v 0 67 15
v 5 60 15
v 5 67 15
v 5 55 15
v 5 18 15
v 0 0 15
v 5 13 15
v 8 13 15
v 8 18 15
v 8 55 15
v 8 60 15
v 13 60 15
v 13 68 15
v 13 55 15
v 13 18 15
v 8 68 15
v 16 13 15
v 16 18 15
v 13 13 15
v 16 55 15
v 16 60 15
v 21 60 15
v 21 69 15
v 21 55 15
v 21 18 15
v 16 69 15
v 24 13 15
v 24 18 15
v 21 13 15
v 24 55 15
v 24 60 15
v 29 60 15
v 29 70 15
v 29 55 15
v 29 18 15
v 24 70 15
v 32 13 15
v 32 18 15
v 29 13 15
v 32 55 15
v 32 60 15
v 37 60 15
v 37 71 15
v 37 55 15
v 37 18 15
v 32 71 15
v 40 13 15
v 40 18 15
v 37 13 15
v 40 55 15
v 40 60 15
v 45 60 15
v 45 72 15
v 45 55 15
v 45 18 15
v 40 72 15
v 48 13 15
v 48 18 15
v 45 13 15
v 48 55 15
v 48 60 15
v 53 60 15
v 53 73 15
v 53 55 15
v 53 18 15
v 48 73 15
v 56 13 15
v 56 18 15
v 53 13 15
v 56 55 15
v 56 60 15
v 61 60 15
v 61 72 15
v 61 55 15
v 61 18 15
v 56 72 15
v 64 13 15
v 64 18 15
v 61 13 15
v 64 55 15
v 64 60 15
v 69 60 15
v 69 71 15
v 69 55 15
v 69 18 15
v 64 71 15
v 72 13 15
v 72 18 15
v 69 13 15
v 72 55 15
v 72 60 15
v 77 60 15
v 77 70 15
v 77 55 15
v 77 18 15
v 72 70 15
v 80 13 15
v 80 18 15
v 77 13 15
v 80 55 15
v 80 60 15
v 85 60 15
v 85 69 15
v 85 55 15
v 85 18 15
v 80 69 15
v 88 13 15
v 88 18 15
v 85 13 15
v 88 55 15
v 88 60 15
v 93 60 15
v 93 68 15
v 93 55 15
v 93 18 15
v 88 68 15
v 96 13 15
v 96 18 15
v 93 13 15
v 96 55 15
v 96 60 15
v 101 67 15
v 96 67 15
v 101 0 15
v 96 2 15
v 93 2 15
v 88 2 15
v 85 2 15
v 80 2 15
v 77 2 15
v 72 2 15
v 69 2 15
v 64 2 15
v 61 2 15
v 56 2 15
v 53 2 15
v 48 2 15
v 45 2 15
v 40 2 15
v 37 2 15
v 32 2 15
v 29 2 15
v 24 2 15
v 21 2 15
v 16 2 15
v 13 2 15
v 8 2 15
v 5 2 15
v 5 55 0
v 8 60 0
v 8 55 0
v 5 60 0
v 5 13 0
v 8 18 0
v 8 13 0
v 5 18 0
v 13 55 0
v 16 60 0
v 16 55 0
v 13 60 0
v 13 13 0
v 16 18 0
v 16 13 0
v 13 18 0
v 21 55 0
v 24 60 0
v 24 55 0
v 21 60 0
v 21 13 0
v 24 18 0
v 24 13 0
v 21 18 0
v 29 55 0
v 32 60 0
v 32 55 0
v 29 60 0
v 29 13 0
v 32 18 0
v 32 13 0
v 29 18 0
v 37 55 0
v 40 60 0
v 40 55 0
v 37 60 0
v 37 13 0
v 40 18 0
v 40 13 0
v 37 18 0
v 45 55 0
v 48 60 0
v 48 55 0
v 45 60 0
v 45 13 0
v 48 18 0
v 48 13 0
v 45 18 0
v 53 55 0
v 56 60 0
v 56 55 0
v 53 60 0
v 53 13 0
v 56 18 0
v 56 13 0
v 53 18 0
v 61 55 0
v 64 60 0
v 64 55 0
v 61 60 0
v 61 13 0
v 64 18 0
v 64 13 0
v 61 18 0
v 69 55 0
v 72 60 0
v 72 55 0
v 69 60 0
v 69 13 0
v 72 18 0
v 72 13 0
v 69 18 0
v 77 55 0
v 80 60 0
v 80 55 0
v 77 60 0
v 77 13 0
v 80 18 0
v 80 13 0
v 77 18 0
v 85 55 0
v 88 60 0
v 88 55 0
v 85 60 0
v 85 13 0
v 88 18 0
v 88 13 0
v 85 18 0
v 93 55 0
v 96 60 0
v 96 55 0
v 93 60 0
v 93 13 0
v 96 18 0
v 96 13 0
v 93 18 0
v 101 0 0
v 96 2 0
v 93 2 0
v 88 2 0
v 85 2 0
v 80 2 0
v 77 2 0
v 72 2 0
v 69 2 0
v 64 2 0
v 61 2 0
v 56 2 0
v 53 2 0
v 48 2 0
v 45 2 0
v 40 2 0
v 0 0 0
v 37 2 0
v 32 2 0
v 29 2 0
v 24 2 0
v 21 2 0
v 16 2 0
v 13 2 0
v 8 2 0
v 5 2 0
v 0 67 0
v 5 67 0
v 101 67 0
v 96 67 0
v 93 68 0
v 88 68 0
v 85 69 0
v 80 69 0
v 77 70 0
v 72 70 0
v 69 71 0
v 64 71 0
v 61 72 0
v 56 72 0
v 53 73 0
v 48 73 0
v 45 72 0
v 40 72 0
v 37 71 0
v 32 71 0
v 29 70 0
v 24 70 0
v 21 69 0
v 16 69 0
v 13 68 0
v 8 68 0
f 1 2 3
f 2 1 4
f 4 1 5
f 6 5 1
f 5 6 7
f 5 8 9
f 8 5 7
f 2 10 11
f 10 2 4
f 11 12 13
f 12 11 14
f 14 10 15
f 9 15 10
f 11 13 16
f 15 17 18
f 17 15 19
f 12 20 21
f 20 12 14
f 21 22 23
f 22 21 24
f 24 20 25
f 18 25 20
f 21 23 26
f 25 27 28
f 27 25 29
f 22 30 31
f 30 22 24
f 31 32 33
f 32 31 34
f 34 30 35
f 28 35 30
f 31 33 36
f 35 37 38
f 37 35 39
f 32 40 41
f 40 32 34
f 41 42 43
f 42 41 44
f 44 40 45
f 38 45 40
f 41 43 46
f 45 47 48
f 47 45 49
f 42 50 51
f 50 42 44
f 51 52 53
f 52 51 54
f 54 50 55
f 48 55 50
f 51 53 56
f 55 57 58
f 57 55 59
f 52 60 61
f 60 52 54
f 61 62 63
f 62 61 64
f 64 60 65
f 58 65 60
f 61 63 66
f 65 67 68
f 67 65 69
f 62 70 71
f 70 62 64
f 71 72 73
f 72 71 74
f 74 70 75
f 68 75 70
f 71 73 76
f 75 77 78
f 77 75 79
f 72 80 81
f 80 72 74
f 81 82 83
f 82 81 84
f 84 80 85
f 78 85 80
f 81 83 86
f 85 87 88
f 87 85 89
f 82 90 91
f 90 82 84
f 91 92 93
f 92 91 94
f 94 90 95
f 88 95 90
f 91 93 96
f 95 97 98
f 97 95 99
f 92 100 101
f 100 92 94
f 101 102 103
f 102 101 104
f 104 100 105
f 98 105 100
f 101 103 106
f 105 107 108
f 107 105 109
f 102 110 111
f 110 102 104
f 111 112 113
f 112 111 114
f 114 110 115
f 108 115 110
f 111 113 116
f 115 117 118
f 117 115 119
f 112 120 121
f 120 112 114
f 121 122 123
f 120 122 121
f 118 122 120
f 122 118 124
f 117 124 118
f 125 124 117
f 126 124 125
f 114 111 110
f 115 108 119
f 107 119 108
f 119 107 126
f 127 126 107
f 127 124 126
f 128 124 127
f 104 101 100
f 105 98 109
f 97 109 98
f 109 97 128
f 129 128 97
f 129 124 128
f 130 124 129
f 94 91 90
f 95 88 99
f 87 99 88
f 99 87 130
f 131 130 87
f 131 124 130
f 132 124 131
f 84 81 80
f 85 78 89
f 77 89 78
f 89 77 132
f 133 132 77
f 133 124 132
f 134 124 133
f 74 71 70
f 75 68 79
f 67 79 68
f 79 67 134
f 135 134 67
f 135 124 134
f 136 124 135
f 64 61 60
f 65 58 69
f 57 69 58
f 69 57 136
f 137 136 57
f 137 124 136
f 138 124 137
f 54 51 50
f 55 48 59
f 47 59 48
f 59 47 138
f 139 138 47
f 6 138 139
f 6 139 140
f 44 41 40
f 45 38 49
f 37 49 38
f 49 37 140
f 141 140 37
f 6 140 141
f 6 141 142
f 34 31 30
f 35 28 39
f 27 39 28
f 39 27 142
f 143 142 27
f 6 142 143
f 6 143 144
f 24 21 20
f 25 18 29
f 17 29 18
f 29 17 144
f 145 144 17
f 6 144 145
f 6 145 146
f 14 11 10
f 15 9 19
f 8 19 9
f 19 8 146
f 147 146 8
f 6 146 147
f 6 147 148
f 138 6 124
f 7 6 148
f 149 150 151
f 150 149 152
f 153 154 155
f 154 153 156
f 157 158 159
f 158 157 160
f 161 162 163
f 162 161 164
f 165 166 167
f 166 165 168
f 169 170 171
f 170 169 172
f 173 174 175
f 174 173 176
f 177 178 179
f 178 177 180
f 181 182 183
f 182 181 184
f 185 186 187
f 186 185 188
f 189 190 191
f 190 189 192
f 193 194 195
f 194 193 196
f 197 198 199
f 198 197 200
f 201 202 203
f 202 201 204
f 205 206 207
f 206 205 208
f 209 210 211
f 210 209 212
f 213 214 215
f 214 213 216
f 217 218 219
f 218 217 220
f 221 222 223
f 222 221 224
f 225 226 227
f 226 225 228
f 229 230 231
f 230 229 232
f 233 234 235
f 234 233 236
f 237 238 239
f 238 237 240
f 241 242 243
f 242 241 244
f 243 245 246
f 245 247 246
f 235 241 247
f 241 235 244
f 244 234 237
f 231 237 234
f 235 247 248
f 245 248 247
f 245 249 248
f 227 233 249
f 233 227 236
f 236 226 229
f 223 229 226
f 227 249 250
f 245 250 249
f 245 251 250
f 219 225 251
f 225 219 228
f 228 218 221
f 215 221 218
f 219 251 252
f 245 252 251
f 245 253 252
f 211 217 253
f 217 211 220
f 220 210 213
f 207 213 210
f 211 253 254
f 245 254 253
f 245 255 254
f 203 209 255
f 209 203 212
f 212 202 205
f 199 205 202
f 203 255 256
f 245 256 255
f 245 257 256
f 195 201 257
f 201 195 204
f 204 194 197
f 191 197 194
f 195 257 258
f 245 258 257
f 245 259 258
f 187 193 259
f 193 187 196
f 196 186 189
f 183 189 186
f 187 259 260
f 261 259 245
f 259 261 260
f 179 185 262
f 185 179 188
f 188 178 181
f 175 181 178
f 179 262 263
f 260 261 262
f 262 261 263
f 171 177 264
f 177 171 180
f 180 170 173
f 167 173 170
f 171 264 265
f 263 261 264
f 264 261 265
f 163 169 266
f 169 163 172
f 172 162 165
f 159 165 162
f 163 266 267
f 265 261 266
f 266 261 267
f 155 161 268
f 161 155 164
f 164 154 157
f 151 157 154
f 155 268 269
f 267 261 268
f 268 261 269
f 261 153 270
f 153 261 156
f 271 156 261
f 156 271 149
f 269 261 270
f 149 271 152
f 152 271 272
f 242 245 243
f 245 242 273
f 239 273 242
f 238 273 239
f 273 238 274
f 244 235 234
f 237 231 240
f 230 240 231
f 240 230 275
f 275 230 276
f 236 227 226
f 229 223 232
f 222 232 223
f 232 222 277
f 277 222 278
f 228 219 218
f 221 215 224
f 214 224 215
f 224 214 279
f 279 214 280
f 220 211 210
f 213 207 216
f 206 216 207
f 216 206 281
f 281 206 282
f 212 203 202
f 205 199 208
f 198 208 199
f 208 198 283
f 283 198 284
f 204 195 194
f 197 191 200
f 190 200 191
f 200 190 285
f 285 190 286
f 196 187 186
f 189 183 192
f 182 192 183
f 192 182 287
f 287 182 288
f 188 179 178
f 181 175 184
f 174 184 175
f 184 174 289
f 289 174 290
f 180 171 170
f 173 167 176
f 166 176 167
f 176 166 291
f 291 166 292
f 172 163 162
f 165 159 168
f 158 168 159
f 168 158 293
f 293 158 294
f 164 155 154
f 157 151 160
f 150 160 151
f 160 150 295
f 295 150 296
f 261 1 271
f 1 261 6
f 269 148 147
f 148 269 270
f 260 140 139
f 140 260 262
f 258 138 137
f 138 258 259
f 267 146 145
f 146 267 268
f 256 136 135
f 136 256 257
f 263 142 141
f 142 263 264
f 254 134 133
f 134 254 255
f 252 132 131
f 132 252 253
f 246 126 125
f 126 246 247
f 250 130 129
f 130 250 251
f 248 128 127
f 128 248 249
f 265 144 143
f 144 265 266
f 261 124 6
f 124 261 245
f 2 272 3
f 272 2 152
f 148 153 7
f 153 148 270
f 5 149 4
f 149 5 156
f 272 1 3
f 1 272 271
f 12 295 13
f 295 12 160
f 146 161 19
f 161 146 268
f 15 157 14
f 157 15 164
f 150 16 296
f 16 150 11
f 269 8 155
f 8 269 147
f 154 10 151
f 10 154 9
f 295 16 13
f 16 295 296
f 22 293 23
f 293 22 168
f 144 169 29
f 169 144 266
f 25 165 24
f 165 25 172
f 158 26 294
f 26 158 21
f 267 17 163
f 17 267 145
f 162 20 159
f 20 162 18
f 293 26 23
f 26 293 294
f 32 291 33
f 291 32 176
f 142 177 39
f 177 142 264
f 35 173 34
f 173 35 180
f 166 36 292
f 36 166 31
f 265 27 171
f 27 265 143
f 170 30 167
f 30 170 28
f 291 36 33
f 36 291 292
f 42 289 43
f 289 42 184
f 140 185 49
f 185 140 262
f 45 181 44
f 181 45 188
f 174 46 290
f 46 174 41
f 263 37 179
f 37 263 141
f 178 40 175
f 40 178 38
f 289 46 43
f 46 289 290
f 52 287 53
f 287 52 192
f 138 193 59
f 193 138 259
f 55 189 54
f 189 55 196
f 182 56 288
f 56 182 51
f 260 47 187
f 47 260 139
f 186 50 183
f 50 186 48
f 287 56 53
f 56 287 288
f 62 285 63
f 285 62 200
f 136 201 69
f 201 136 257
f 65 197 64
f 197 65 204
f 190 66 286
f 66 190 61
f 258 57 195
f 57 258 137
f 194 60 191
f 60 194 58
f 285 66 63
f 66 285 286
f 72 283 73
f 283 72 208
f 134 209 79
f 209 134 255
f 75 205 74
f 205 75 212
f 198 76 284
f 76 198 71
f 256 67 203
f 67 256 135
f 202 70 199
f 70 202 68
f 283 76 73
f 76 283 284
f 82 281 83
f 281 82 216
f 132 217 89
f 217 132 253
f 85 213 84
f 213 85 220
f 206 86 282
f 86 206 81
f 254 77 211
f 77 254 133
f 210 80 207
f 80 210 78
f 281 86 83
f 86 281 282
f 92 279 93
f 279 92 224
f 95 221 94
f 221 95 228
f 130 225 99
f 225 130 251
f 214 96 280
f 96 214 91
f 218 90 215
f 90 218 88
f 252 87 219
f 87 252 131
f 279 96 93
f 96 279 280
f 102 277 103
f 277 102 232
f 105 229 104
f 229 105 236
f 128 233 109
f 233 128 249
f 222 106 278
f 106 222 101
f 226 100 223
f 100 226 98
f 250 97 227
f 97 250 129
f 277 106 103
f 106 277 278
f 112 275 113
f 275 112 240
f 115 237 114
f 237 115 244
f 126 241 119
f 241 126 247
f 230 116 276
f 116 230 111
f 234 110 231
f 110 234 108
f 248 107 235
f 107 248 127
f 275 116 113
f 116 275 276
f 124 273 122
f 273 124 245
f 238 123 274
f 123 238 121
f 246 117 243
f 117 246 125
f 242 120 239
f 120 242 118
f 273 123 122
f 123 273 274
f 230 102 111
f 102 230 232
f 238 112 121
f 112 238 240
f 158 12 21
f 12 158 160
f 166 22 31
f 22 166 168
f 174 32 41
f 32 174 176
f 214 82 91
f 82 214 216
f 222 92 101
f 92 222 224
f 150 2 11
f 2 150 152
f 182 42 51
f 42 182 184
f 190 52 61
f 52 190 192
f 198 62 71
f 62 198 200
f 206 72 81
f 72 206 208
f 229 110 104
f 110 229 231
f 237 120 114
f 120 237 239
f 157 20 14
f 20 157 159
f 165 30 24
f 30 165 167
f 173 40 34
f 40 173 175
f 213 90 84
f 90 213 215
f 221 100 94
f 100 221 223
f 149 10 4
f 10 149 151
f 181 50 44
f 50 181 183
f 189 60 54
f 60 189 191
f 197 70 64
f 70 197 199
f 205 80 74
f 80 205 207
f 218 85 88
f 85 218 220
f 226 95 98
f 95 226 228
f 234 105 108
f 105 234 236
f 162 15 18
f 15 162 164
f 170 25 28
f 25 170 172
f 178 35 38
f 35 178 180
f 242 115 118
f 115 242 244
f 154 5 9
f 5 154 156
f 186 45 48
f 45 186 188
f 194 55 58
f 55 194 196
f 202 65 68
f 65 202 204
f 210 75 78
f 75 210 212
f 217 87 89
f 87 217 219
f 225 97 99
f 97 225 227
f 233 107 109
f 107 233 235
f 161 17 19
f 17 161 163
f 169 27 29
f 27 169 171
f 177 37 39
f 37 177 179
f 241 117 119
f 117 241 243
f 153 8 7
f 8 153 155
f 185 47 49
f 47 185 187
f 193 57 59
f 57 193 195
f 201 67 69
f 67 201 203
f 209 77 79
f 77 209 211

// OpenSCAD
// Забор by @Karimov_Sheroz

cube([100, 2, 15]); color([0.56,0.23,0])  // параллелепипед со сторонами 100,2,15  мм
cube([100, 2, 15]); color([0.56,0.23,0])  // параллелепипед со сторонами 100,2,15  мм  
  translate([0,0,0]) cube([5, 67, 15]); color([0.56,0.23,0])  // параллелепипед со сторонами 5, 67, 15  мм
translate([8,0,0]) cube([5, 68, 15]); color([0.56,0.23,0])  //параллелепипед со сторонами 5, 68, 15  мм
translate([16,0,0]) cube([5, 69, 15]); color([0.56,0.23,0])  // параллелепипед со сторонами 5, 69, 15  мм 
translate([24,0,0]) cube([5, 70, 15]); color([0.56,0.23,0])  // параллелепипед со сторонами 5, 70, 15  мм  
translate([32,0,0]) cube([5, 71, 15]); color([0.56,0.23,0])   //параллелепипед со сторонами 5, 71, 15  мм
  translate([40,0,0]) cube([5, 72, 15]); color([0.56,0.23,0])   //параллелепипед со сторонами 5, 72, 15  мм
translate([48,0,0]) cube([5, 73, 15]); color([0.56,0.23,0])   //параллелепипед со сторонами 5, 73, 15  мм
 translate([56,0,0]) cube([5, 72, 15]); color([0.56,0.23,0])  //параллелепипед со сторонами 5, 72, 15  мм
 translate([64,0,0]) cube([5, 71, 15]); color([0.56,0.23,0])  //параллелепипед со сторонами 5, 71, 15  мм
translate([72,0,0]) cube([5, 70, 15]); color([0.56,0.23,0])  //параллелепипед со сторонами 5, 70, 15  мм 
translate([80,0,0]) cube([5, 69, 15]); color([0.56,0.23,0])  //параллелепипед со сторонами 5, 69, 15  мм
translate([88,0,0]) cube([5, 68, 15]); color([0.56,0.23,0])  //параллелепипед со сторонами 5, 68, 15  мм
translate([96,0,0]) cube([5, 67, 15]);  // параллелепипед со сторонами 5, 67, 15 мм 
cube([100, 2, 15]);  //параллелепипед со сторонами 100,2,15  мм
translate([0,55,0]) cube([100, 5, 15]); color([0.56,0.23,0]) //параллелепипед со сторонами 100,5,15  мм
cube([100, 2, 15]);
translate([0,13,0]) cube([100, 5, 15]); //параллелепипед со сторонами 100,5,15  мм
